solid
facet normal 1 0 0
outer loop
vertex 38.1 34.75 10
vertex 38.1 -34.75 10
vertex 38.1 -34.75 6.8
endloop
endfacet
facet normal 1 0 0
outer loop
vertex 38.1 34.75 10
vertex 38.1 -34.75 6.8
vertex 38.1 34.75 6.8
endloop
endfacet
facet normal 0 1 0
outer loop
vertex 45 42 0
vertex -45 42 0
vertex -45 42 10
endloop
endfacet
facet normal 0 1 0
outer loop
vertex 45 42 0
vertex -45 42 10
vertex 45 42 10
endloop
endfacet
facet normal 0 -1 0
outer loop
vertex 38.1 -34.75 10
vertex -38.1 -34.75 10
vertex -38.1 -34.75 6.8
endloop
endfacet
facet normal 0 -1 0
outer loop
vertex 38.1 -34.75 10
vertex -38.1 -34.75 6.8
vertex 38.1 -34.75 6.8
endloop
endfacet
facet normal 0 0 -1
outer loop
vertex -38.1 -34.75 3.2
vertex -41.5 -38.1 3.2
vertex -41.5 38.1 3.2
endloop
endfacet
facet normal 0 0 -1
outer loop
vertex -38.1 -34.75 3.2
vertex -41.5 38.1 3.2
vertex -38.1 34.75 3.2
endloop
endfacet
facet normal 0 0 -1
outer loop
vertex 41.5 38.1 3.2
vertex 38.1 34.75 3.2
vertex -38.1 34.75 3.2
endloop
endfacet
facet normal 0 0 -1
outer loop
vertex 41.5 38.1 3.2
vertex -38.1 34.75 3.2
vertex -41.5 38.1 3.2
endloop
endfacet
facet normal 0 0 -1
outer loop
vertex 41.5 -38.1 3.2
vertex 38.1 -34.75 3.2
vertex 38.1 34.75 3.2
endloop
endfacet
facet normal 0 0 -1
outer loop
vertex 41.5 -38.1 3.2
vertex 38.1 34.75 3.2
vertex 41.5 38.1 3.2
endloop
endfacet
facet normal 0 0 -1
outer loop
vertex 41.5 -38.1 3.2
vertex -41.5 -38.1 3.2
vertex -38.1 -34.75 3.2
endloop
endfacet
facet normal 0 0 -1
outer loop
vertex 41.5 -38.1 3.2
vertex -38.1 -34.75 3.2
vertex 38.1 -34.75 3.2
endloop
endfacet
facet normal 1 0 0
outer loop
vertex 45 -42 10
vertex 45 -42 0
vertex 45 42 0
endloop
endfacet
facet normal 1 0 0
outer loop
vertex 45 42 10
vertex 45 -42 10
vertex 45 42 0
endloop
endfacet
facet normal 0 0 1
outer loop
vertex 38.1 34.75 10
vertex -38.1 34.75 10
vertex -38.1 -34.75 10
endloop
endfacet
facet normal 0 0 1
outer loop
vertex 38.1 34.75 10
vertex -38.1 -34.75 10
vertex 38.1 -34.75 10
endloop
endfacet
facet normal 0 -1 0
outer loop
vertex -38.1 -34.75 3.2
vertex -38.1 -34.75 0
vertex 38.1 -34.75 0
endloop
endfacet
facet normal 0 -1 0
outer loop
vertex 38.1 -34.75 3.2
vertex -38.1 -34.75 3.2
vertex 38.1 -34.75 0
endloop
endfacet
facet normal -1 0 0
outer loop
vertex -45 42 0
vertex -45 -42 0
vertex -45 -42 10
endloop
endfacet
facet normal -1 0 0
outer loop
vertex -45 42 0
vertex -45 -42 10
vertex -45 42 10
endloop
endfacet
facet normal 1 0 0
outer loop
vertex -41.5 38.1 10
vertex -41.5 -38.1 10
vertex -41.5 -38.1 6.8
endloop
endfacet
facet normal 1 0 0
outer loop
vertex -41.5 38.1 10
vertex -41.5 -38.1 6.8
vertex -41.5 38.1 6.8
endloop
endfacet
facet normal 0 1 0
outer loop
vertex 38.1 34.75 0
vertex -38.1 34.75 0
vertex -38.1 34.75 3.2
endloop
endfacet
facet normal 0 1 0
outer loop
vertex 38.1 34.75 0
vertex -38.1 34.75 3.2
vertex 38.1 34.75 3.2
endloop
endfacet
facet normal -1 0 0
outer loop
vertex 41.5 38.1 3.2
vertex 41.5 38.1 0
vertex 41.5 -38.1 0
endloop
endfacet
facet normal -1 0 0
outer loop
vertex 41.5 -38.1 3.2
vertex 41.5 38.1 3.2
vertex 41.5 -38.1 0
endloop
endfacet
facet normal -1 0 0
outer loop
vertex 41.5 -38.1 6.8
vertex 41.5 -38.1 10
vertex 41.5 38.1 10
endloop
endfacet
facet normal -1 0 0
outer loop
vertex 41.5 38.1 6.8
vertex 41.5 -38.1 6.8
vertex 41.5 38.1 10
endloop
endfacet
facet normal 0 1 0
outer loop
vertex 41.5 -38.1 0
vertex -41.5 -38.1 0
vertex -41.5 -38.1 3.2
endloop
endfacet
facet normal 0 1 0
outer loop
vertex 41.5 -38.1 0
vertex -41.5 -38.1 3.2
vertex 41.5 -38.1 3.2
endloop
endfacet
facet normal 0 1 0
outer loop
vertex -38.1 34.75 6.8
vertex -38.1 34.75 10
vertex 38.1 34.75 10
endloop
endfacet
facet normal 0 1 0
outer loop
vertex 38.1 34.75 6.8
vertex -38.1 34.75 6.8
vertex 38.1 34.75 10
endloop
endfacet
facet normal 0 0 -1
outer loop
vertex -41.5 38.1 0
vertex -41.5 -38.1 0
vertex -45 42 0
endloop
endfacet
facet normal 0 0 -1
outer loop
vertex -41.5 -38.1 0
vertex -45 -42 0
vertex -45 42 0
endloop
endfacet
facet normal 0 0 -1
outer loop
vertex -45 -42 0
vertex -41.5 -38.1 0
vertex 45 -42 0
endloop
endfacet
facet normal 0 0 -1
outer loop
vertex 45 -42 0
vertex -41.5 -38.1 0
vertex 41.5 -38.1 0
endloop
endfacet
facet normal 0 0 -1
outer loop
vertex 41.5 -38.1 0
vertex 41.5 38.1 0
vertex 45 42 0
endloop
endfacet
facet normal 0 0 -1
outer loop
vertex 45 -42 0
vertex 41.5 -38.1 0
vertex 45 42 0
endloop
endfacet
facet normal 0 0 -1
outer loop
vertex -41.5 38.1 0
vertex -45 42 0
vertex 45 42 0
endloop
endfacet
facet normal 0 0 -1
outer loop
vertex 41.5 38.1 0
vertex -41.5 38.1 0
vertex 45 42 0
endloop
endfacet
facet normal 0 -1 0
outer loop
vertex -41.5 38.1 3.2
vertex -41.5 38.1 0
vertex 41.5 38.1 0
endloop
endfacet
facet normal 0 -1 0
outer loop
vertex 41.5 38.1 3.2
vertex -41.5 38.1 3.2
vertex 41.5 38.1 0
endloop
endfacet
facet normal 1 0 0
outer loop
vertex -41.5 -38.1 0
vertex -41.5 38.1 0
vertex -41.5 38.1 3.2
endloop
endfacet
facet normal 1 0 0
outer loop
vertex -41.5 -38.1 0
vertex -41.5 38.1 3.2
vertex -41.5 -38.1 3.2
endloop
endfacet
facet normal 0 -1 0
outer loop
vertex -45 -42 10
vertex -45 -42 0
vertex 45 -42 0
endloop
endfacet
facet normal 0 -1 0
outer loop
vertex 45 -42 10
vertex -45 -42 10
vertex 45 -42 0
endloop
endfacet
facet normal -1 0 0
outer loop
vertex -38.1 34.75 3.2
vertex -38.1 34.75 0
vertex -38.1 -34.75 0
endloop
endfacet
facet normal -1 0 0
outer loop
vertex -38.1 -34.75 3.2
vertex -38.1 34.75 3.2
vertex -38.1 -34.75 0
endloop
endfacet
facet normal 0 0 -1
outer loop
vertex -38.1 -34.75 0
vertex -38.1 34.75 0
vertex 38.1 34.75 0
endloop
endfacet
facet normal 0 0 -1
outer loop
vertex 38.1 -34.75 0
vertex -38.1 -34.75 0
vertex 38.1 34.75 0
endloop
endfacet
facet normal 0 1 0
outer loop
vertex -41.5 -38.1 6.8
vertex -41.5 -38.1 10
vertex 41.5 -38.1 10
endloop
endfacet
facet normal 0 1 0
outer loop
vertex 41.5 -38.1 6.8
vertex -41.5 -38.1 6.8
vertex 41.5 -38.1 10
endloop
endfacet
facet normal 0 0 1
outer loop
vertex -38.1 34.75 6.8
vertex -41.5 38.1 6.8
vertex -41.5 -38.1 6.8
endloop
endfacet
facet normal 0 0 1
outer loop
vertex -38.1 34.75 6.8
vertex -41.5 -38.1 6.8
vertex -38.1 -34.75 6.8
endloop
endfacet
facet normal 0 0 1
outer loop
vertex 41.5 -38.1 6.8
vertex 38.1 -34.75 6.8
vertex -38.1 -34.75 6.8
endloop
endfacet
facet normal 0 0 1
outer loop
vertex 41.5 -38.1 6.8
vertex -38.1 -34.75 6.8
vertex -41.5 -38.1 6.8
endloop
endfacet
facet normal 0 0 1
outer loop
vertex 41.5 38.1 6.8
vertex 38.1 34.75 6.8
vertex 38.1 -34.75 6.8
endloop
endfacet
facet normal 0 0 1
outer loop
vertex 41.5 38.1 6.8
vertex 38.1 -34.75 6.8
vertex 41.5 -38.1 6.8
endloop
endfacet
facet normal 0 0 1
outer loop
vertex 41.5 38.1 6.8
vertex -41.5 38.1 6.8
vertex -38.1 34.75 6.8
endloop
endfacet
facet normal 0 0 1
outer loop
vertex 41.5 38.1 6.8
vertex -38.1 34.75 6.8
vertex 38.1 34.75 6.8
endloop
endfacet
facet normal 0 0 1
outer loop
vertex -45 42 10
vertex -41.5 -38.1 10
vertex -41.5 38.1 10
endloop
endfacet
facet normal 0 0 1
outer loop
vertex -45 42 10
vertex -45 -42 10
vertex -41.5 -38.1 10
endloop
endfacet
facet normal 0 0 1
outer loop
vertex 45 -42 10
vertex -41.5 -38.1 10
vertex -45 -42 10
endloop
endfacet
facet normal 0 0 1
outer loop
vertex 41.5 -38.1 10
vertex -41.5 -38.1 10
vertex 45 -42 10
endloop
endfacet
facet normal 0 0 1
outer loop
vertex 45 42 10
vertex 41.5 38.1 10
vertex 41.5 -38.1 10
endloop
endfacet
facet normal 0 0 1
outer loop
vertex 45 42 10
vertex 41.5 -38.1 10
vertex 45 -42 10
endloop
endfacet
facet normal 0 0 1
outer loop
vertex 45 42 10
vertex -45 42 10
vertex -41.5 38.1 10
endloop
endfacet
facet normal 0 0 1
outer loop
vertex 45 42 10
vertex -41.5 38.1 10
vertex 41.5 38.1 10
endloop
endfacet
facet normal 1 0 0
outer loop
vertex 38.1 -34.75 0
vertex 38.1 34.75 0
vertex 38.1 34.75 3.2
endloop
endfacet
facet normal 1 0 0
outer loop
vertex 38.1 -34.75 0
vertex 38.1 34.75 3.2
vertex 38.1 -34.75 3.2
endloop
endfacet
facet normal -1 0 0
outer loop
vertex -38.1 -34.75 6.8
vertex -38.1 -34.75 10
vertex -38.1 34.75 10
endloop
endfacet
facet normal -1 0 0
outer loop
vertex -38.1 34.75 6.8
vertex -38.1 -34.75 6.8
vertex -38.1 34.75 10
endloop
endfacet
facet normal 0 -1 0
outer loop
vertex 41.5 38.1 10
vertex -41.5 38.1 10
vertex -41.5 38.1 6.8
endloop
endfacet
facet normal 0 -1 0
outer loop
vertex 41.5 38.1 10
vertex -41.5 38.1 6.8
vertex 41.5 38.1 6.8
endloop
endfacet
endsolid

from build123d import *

# Parameters (mm, degrees)
F0_W     = 90
F0_H     = 84
F1_DEPTH = 10
F2_W     = 83
F2_H     = 76.2
F2_W_2   = 76.2
F2_H_2   = 69.5
F3_DEPTH = 3.2
F4_W     = 83
F4_H     = 76.2
F4_W_2   = 76.2
F4_H_2   = 69.5
F5_DEPTH = 3.2


with BuildPart() as f1:
    # F0 (on Top) → F1 (new body)
    with BuildSketch(Plane.XY):
        Rectangle(F0_W, F0_H)
    extrude(amount=F1_DEPTH)

    # F2 (on face) → F3 (cut)
    with BuildSketch(Plane.XY.offset(10)):
        Rectangle(F2_W, F2_H)
        Rectangle(F2_W_2, F2_H_2, mode=Mode.SUBTRACT)
    extrude(amount=-F3_DEPTH, mode=Mode.SUBTRACT)

    # F4 (on face) → F5 (cut)
    with BuildSketch(Plane(origin=(0, 0, 0), x_dir=(1, 0, 0), z_dir=(0, 0, -1))):
        Rectangle(F4_W, F4_H)
        Rectangle(F4_W_2, F4_H_2, mode=Mode.SUBTRACT)
    extrude(amount=-F5_DEPTH, mode=Mode.SUBTRACT)


solid = f1.part
